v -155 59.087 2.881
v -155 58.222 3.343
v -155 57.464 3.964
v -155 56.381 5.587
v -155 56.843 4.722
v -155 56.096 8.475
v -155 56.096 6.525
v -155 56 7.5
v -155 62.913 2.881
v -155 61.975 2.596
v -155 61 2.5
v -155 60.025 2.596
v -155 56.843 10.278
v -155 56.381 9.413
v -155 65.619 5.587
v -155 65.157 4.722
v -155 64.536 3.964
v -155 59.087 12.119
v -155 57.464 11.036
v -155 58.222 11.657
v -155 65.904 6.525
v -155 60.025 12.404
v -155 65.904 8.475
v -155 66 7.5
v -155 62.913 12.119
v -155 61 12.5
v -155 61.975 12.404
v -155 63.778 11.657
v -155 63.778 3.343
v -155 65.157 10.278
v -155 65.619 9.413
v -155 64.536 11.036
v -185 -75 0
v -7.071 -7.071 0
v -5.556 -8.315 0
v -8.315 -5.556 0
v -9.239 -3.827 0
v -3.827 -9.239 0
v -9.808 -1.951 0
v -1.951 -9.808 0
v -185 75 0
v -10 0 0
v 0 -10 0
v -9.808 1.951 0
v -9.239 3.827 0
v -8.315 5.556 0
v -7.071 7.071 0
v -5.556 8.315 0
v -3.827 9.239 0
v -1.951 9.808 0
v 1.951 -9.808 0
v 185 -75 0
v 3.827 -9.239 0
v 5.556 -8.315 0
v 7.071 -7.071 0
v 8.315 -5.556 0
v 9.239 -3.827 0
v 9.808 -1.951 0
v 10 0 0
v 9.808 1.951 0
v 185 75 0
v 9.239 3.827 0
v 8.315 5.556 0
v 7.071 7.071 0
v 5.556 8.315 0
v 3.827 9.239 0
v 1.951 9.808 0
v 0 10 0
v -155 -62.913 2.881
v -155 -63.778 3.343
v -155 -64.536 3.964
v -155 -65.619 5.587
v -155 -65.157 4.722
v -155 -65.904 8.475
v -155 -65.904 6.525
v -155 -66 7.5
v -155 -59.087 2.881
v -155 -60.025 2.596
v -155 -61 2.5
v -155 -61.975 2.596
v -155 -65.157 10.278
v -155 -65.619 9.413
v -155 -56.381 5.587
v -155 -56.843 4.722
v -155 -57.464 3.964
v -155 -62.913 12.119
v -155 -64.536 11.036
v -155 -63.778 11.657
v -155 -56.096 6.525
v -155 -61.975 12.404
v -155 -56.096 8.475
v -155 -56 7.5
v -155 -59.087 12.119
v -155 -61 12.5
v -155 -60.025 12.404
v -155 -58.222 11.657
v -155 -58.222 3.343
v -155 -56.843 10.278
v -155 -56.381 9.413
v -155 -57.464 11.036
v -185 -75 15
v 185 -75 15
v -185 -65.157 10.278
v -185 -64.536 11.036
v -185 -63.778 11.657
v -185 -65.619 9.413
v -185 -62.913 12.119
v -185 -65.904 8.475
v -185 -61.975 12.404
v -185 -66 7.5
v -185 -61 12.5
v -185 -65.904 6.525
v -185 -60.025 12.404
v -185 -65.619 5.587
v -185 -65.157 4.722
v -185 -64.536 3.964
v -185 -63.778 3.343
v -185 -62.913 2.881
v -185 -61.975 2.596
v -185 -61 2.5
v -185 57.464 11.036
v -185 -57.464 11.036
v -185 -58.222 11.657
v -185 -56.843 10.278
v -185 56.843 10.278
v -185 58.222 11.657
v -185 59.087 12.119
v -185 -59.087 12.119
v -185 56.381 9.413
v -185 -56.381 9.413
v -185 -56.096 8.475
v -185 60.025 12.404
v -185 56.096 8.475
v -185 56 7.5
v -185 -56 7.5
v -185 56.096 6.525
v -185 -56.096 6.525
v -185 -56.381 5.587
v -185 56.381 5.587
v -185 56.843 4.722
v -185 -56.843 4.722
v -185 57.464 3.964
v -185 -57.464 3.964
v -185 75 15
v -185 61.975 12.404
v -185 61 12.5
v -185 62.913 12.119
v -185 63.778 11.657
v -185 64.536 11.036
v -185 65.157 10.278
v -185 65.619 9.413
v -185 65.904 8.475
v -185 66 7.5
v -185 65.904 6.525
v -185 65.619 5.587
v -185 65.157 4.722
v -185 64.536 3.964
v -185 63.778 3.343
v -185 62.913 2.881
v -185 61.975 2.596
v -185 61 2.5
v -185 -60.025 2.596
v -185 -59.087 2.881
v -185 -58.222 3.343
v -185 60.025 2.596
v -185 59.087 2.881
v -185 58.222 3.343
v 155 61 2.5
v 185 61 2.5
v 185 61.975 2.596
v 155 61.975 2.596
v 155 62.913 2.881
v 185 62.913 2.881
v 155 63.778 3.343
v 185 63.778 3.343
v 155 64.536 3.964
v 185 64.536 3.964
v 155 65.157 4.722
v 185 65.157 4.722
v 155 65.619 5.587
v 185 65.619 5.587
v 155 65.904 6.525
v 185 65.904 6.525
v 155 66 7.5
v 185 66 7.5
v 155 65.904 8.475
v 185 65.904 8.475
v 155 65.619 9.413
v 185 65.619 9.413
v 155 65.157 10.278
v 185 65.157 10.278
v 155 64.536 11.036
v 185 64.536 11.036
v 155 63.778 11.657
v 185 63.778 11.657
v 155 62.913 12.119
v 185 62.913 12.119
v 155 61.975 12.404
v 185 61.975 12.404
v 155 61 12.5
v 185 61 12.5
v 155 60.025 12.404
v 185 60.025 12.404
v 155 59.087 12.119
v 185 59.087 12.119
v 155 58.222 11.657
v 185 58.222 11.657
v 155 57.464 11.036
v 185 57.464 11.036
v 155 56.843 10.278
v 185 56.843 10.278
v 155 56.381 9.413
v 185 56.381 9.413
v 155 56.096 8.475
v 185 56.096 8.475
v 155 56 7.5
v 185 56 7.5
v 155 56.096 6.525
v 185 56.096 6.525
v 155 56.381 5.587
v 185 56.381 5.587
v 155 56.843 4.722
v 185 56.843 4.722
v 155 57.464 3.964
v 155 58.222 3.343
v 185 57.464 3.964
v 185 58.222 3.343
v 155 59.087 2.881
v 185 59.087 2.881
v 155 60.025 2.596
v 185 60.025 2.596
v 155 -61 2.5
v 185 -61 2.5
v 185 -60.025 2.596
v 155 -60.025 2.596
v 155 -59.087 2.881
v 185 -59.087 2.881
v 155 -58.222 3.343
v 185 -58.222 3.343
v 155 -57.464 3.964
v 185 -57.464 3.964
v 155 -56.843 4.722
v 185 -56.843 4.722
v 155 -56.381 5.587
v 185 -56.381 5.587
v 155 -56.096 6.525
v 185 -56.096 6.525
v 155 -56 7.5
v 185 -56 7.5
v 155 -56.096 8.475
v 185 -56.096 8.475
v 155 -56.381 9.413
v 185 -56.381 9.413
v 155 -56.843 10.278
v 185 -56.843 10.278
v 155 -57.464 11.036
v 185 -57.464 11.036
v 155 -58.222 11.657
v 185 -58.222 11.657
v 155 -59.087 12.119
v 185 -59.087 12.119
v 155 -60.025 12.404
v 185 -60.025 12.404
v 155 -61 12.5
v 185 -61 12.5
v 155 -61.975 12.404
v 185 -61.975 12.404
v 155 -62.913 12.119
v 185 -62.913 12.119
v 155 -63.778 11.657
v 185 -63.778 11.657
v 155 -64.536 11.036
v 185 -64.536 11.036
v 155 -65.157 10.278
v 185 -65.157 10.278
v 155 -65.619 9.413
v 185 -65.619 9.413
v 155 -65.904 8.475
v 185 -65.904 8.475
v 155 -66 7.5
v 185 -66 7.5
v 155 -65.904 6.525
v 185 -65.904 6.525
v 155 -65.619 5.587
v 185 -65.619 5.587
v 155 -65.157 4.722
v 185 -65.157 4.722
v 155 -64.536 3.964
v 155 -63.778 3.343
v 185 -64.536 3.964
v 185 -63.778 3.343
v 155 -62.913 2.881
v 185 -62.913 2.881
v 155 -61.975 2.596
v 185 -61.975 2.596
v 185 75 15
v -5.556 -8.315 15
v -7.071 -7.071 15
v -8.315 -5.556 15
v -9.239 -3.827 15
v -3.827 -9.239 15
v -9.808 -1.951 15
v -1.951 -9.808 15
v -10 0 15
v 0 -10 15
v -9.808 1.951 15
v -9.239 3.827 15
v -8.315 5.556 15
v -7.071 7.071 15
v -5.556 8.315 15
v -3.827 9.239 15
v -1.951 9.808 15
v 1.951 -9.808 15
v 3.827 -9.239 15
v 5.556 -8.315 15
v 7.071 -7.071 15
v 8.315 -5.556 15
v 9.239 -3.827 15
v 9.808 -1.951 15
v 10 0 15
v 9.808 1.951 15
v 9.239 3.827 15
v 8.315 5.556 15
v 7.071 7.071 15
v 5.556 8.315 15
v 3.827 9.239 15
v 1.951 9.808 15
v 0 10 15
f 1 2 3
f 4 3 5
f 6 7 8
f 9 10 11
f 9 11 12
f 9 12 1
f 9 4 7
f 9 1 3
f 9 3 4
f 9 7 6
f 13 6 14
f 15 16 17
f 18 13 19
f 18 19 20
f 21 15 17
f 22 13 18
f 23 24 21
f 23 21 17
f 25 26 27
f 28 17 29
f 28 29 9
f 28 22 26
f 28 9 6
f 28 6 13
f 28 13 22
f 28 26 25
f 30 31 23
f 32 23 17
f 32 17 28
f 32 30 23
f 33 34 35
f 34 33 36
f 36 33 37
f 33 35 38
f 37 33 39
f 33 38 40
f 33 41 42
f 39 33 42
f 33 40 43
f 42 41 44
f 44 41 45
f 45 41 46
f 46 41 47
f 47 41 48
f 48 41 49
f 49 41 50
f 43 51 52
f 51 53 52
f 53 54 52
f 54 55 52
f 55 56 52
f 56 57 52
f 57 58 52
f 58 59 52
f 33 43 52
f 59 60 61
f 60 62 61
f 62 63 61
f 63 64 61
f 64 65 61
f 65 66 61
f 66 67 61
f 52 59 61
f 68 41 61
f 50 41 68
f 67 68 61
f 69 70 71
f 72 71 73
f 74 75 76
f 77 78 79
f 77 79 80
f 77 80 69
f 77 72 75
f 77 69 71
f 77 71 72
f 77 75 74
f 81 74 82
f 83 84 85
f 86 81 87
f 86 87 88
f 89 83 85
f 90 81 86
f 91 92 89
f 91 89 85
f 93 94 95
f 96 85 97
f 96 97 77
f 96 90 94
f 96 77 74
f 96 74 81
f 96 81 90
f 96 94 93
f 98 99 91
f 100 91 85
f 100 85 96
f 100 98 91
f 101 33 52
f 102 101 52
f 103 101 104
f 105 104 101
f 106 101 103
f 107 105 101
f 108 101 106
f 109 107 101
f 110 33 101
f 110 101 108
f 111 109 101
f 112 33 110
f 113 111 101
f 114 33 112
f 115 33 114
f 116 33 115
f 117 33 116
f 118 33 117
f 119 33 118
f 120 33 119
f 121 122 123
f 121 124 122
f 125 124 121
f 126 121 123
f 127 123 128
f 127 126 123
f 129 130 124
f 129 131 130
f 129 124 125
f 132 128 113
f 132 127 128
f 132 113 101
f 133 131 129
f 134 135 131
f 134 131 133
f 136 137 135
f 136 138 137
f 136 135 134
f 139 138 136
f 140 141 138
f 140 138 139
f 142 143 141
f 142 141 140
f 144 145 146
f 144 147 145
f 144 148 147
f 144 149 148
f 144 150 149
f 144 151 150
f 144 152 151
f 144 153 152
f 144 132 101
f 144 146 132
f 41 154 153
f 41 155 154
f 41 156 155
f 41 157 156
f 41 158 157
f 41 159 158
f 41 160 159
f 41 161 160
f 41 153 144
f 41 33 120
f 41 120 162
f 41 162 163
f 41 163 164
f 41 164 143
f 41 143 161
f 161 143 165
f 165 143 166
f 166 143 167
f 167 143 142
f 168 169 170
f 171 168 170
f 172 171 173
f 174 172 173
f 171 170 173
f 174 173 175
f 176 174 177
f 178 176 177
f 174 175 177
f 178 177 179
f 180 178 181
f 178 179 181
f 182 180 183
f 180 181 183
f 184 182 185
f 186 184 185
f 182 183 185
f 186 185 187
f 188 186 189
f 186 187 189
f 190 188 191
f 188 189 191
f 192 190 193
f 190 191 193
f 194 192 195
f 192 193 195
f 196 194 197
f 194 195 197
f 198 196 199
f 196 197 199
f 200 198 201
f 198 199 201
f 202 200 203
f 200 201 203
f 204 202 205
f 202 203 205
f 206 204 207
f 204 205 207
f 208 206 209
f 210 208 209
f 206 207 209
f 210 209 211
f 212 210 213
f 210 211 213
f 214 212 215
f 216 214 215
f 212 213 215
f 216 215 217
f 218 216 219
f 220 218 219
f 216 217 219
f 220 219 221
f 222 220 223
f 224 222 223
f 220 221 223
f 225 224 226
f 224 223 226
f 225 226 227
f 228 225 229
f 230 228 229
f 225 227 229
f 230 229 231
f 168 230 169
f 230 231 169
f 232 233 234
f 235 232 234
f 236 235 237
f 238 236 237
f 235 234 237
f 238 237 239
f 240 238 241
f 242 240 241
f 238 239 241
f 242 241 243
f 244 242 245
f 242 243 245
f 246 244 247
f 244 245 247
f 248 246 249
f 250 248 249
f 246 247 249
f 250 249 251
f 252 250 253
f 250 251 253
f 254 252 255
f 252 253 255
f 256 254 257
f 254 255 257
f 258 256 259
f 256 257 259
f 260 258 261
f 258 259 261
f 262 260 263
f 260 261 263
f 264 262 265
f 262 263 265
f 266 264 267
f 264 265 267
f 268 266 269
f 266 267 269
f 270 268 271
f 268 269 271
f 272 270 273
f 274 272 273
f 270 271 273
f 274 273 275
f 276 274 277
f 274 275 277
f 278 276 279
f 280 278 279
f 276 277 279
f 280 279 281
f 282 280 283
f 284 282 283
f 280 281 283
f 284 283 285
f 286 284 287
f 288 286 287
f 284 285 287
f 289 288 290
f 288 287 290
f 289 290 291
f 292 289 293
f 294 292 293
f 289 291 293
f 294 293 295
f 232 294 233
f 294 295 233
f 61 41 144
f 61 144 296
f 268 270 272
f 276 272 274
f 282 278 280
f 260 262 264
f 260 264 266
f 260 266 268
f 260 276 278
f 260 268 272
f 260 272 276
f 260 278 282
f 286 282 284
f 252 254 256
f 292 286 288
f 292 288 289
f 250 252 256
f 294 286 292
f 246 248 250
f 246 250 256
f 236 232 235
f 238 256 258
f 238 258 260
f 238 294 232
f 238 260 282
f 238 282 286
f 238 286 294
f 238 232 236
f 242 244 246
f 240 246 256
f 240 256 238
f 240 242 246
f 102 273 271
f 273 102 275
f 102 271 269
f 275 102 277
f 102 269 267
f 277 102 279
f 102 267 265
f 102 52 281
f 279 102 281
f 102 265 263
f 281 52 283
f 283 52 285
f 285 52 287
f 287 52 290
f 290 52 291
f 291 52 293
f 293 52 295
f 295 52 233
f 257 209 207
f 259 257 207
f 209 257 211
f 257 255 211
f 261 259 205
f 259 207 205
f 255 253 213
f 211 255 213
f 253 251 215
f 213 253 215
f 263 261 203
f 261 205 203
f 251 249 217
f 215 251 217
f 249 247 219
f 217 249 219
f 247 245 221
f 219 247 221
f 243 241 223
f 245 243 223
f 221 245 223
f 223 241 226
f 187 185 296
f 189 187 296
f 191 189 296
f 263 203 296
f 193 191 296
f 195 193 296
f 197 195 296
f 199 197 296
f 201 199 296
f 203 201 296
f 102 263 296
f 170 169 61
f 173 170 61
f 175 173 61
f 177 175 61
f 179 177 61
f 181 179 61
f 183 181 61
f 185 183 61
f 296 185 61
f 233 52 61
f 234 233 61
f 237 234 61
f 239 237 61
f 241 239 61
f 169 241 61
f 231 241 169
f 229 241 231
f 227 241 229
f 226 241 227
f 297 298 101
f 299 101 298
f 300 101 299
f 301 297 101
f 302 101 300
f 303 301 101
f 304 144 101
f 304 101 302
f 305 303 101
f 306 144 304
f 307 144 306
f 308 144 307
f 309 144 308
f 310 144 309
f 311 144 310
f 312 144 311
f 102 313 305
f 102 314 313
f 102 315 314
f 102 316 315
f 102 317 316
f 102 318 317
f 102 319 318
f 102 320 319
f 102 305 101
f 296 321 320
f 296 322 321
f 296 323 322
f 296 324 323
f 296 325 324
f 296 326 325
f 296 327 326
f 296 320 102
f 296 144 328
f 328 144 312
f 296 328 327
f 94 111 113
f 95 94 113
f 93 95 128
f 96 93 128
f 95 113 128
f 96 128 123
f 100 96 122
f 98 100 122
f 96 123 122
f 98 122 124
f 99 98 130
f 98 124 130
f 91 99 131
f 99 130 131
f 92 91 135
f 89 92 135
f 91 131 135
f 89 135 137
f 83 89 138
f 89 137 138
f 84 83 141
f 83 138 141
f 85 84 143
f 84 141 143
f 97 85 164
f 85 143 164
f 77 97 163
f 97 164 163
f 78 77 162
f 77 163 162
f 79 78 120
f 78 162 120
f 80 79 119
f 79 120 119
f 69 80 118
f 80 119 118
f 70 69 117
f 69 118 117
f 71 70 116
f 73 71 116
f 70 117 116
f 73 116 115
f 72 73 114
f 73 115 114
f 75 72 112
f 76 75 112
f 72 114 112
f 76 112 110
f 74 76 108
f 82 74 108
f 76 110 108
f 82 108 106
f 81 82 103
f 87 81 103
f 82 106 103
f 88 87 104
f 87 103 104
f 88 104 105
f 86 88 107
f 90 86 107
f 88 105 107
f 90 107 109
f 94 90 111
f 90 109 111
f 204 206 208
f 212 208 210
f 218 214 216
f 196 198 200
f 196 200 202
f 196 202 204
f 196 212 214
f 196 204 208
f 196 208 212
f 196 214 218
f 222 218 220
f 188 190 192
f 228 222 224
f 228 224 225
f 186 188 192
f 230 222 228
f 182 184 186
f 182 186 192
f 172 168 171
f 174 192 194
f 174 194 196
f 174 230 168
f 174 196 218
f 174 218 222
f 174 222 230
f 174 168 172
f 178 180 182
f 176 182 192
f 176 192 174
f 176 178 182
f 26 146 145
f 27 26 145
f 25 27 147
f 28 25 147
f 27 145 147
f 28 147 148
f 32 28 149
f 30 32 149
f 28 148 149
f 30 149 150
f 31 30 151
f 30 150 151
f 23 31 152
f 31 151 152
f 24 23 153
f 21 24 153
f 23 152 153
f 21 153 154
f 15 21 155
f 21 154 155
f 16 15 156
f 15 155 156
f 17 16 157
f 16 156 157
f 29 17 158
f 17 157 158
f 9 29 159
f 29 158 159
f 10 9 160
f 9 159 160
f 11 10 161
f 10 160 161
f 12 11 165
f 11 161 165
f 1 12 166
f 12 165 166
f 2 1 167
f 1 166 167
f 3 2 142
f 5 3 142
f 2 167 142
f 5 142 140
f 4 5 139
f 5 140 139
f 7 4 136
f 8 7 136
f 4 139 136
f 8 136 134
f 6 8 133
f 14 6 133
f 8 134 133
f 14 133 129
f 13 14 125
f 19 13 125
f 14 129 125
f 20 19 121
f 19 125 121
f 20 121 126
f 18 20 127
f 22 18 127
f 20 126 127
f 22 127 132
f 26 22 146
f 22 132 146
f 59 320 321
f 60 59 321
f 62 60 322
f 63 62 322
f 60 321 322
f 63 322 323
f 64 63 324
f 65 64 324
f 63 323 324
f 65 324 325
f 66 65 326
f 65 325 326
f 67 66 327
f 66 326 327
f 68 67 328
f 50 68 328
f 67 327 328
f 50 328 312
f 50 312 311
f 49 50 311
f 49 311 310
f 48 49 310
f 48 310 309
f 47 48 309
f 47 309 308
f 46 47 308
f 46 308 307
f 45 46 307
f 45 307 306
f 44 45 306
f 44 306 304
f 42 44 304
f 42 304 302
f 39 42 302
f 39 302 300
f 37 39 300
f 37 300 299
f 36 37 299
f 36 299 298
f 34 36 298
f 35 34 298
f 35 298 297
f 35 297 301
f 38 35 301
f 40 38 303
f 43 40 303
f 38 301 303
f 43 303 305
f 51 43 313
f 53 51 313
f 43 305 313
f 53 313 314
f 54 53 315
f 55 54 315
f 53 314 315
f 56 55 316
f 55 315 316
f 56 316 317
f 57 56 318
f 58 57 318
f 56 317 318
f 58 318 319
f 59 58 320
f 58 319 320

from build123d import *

# Parameters (mm, degrees)
SKETCH1_W           = 370
SKETCH1_H           = 150
BOSS_EXTRUDE1_DEPTH = 15
SKETCH2_R           = 5
CUT_EXTRUDE1_DEPTH  = 30
SKETCH3_R           = 5
CUT_EXTRUDE2_DEPTH  = 30
SKETCH4_R           = 10
CUT_EXTRUDE3_DEPTH  = 16


with BuildPart() as part:
    # Sketch1 → Boss-Extrude1 (new body)
    with BuildSketch(Plane.XY):
        Rectangle(SKETCH1_W, SKETCH1_H)
    extrude(amount=BOSS_EXTRUDE1_DEPTH)

    # Sketch2 → Cut-Extrude1 (cut)
    with BuildSketch(Plane.ZY.offset(185)):
        with Locations((7.5, 61)):
            Circle(SKETCH2_R)
        with Locations((7.5, -61)):
            Circle(SKETCH2_R)
    extrude(amount=-CUT_EXTRUDE1_DEPTH, mode=Mode.SUBTRACT)

    # Sketch3 → Cut-Extrude2 (cut)
    with BuildSketch(Plane(origin=(185, 0, 0), x_dir=(0, 0, -1), z_dir=(1, 0, 0))):
        with Locations((-7.5, 61)):
            Circle(SKETCH3_R)
        with Locations((-7.5, -61)):
            Circle(SKETCH3_R)
    extrude(amount=-CUT_EXTRUDE2_DEPTH, mode=Mode.SUBTRACT)

    # Sketch4 → Cut-Extrude3 (cut, through all)
    with BuildSketch(Plane.XY.offset(15)):
        Circle(SKETCH4_R)
    extrude(amount=-CUT_EXTRUDE3_DEPTH, mode=Mode.SUBTRACT)


solid = part.part
